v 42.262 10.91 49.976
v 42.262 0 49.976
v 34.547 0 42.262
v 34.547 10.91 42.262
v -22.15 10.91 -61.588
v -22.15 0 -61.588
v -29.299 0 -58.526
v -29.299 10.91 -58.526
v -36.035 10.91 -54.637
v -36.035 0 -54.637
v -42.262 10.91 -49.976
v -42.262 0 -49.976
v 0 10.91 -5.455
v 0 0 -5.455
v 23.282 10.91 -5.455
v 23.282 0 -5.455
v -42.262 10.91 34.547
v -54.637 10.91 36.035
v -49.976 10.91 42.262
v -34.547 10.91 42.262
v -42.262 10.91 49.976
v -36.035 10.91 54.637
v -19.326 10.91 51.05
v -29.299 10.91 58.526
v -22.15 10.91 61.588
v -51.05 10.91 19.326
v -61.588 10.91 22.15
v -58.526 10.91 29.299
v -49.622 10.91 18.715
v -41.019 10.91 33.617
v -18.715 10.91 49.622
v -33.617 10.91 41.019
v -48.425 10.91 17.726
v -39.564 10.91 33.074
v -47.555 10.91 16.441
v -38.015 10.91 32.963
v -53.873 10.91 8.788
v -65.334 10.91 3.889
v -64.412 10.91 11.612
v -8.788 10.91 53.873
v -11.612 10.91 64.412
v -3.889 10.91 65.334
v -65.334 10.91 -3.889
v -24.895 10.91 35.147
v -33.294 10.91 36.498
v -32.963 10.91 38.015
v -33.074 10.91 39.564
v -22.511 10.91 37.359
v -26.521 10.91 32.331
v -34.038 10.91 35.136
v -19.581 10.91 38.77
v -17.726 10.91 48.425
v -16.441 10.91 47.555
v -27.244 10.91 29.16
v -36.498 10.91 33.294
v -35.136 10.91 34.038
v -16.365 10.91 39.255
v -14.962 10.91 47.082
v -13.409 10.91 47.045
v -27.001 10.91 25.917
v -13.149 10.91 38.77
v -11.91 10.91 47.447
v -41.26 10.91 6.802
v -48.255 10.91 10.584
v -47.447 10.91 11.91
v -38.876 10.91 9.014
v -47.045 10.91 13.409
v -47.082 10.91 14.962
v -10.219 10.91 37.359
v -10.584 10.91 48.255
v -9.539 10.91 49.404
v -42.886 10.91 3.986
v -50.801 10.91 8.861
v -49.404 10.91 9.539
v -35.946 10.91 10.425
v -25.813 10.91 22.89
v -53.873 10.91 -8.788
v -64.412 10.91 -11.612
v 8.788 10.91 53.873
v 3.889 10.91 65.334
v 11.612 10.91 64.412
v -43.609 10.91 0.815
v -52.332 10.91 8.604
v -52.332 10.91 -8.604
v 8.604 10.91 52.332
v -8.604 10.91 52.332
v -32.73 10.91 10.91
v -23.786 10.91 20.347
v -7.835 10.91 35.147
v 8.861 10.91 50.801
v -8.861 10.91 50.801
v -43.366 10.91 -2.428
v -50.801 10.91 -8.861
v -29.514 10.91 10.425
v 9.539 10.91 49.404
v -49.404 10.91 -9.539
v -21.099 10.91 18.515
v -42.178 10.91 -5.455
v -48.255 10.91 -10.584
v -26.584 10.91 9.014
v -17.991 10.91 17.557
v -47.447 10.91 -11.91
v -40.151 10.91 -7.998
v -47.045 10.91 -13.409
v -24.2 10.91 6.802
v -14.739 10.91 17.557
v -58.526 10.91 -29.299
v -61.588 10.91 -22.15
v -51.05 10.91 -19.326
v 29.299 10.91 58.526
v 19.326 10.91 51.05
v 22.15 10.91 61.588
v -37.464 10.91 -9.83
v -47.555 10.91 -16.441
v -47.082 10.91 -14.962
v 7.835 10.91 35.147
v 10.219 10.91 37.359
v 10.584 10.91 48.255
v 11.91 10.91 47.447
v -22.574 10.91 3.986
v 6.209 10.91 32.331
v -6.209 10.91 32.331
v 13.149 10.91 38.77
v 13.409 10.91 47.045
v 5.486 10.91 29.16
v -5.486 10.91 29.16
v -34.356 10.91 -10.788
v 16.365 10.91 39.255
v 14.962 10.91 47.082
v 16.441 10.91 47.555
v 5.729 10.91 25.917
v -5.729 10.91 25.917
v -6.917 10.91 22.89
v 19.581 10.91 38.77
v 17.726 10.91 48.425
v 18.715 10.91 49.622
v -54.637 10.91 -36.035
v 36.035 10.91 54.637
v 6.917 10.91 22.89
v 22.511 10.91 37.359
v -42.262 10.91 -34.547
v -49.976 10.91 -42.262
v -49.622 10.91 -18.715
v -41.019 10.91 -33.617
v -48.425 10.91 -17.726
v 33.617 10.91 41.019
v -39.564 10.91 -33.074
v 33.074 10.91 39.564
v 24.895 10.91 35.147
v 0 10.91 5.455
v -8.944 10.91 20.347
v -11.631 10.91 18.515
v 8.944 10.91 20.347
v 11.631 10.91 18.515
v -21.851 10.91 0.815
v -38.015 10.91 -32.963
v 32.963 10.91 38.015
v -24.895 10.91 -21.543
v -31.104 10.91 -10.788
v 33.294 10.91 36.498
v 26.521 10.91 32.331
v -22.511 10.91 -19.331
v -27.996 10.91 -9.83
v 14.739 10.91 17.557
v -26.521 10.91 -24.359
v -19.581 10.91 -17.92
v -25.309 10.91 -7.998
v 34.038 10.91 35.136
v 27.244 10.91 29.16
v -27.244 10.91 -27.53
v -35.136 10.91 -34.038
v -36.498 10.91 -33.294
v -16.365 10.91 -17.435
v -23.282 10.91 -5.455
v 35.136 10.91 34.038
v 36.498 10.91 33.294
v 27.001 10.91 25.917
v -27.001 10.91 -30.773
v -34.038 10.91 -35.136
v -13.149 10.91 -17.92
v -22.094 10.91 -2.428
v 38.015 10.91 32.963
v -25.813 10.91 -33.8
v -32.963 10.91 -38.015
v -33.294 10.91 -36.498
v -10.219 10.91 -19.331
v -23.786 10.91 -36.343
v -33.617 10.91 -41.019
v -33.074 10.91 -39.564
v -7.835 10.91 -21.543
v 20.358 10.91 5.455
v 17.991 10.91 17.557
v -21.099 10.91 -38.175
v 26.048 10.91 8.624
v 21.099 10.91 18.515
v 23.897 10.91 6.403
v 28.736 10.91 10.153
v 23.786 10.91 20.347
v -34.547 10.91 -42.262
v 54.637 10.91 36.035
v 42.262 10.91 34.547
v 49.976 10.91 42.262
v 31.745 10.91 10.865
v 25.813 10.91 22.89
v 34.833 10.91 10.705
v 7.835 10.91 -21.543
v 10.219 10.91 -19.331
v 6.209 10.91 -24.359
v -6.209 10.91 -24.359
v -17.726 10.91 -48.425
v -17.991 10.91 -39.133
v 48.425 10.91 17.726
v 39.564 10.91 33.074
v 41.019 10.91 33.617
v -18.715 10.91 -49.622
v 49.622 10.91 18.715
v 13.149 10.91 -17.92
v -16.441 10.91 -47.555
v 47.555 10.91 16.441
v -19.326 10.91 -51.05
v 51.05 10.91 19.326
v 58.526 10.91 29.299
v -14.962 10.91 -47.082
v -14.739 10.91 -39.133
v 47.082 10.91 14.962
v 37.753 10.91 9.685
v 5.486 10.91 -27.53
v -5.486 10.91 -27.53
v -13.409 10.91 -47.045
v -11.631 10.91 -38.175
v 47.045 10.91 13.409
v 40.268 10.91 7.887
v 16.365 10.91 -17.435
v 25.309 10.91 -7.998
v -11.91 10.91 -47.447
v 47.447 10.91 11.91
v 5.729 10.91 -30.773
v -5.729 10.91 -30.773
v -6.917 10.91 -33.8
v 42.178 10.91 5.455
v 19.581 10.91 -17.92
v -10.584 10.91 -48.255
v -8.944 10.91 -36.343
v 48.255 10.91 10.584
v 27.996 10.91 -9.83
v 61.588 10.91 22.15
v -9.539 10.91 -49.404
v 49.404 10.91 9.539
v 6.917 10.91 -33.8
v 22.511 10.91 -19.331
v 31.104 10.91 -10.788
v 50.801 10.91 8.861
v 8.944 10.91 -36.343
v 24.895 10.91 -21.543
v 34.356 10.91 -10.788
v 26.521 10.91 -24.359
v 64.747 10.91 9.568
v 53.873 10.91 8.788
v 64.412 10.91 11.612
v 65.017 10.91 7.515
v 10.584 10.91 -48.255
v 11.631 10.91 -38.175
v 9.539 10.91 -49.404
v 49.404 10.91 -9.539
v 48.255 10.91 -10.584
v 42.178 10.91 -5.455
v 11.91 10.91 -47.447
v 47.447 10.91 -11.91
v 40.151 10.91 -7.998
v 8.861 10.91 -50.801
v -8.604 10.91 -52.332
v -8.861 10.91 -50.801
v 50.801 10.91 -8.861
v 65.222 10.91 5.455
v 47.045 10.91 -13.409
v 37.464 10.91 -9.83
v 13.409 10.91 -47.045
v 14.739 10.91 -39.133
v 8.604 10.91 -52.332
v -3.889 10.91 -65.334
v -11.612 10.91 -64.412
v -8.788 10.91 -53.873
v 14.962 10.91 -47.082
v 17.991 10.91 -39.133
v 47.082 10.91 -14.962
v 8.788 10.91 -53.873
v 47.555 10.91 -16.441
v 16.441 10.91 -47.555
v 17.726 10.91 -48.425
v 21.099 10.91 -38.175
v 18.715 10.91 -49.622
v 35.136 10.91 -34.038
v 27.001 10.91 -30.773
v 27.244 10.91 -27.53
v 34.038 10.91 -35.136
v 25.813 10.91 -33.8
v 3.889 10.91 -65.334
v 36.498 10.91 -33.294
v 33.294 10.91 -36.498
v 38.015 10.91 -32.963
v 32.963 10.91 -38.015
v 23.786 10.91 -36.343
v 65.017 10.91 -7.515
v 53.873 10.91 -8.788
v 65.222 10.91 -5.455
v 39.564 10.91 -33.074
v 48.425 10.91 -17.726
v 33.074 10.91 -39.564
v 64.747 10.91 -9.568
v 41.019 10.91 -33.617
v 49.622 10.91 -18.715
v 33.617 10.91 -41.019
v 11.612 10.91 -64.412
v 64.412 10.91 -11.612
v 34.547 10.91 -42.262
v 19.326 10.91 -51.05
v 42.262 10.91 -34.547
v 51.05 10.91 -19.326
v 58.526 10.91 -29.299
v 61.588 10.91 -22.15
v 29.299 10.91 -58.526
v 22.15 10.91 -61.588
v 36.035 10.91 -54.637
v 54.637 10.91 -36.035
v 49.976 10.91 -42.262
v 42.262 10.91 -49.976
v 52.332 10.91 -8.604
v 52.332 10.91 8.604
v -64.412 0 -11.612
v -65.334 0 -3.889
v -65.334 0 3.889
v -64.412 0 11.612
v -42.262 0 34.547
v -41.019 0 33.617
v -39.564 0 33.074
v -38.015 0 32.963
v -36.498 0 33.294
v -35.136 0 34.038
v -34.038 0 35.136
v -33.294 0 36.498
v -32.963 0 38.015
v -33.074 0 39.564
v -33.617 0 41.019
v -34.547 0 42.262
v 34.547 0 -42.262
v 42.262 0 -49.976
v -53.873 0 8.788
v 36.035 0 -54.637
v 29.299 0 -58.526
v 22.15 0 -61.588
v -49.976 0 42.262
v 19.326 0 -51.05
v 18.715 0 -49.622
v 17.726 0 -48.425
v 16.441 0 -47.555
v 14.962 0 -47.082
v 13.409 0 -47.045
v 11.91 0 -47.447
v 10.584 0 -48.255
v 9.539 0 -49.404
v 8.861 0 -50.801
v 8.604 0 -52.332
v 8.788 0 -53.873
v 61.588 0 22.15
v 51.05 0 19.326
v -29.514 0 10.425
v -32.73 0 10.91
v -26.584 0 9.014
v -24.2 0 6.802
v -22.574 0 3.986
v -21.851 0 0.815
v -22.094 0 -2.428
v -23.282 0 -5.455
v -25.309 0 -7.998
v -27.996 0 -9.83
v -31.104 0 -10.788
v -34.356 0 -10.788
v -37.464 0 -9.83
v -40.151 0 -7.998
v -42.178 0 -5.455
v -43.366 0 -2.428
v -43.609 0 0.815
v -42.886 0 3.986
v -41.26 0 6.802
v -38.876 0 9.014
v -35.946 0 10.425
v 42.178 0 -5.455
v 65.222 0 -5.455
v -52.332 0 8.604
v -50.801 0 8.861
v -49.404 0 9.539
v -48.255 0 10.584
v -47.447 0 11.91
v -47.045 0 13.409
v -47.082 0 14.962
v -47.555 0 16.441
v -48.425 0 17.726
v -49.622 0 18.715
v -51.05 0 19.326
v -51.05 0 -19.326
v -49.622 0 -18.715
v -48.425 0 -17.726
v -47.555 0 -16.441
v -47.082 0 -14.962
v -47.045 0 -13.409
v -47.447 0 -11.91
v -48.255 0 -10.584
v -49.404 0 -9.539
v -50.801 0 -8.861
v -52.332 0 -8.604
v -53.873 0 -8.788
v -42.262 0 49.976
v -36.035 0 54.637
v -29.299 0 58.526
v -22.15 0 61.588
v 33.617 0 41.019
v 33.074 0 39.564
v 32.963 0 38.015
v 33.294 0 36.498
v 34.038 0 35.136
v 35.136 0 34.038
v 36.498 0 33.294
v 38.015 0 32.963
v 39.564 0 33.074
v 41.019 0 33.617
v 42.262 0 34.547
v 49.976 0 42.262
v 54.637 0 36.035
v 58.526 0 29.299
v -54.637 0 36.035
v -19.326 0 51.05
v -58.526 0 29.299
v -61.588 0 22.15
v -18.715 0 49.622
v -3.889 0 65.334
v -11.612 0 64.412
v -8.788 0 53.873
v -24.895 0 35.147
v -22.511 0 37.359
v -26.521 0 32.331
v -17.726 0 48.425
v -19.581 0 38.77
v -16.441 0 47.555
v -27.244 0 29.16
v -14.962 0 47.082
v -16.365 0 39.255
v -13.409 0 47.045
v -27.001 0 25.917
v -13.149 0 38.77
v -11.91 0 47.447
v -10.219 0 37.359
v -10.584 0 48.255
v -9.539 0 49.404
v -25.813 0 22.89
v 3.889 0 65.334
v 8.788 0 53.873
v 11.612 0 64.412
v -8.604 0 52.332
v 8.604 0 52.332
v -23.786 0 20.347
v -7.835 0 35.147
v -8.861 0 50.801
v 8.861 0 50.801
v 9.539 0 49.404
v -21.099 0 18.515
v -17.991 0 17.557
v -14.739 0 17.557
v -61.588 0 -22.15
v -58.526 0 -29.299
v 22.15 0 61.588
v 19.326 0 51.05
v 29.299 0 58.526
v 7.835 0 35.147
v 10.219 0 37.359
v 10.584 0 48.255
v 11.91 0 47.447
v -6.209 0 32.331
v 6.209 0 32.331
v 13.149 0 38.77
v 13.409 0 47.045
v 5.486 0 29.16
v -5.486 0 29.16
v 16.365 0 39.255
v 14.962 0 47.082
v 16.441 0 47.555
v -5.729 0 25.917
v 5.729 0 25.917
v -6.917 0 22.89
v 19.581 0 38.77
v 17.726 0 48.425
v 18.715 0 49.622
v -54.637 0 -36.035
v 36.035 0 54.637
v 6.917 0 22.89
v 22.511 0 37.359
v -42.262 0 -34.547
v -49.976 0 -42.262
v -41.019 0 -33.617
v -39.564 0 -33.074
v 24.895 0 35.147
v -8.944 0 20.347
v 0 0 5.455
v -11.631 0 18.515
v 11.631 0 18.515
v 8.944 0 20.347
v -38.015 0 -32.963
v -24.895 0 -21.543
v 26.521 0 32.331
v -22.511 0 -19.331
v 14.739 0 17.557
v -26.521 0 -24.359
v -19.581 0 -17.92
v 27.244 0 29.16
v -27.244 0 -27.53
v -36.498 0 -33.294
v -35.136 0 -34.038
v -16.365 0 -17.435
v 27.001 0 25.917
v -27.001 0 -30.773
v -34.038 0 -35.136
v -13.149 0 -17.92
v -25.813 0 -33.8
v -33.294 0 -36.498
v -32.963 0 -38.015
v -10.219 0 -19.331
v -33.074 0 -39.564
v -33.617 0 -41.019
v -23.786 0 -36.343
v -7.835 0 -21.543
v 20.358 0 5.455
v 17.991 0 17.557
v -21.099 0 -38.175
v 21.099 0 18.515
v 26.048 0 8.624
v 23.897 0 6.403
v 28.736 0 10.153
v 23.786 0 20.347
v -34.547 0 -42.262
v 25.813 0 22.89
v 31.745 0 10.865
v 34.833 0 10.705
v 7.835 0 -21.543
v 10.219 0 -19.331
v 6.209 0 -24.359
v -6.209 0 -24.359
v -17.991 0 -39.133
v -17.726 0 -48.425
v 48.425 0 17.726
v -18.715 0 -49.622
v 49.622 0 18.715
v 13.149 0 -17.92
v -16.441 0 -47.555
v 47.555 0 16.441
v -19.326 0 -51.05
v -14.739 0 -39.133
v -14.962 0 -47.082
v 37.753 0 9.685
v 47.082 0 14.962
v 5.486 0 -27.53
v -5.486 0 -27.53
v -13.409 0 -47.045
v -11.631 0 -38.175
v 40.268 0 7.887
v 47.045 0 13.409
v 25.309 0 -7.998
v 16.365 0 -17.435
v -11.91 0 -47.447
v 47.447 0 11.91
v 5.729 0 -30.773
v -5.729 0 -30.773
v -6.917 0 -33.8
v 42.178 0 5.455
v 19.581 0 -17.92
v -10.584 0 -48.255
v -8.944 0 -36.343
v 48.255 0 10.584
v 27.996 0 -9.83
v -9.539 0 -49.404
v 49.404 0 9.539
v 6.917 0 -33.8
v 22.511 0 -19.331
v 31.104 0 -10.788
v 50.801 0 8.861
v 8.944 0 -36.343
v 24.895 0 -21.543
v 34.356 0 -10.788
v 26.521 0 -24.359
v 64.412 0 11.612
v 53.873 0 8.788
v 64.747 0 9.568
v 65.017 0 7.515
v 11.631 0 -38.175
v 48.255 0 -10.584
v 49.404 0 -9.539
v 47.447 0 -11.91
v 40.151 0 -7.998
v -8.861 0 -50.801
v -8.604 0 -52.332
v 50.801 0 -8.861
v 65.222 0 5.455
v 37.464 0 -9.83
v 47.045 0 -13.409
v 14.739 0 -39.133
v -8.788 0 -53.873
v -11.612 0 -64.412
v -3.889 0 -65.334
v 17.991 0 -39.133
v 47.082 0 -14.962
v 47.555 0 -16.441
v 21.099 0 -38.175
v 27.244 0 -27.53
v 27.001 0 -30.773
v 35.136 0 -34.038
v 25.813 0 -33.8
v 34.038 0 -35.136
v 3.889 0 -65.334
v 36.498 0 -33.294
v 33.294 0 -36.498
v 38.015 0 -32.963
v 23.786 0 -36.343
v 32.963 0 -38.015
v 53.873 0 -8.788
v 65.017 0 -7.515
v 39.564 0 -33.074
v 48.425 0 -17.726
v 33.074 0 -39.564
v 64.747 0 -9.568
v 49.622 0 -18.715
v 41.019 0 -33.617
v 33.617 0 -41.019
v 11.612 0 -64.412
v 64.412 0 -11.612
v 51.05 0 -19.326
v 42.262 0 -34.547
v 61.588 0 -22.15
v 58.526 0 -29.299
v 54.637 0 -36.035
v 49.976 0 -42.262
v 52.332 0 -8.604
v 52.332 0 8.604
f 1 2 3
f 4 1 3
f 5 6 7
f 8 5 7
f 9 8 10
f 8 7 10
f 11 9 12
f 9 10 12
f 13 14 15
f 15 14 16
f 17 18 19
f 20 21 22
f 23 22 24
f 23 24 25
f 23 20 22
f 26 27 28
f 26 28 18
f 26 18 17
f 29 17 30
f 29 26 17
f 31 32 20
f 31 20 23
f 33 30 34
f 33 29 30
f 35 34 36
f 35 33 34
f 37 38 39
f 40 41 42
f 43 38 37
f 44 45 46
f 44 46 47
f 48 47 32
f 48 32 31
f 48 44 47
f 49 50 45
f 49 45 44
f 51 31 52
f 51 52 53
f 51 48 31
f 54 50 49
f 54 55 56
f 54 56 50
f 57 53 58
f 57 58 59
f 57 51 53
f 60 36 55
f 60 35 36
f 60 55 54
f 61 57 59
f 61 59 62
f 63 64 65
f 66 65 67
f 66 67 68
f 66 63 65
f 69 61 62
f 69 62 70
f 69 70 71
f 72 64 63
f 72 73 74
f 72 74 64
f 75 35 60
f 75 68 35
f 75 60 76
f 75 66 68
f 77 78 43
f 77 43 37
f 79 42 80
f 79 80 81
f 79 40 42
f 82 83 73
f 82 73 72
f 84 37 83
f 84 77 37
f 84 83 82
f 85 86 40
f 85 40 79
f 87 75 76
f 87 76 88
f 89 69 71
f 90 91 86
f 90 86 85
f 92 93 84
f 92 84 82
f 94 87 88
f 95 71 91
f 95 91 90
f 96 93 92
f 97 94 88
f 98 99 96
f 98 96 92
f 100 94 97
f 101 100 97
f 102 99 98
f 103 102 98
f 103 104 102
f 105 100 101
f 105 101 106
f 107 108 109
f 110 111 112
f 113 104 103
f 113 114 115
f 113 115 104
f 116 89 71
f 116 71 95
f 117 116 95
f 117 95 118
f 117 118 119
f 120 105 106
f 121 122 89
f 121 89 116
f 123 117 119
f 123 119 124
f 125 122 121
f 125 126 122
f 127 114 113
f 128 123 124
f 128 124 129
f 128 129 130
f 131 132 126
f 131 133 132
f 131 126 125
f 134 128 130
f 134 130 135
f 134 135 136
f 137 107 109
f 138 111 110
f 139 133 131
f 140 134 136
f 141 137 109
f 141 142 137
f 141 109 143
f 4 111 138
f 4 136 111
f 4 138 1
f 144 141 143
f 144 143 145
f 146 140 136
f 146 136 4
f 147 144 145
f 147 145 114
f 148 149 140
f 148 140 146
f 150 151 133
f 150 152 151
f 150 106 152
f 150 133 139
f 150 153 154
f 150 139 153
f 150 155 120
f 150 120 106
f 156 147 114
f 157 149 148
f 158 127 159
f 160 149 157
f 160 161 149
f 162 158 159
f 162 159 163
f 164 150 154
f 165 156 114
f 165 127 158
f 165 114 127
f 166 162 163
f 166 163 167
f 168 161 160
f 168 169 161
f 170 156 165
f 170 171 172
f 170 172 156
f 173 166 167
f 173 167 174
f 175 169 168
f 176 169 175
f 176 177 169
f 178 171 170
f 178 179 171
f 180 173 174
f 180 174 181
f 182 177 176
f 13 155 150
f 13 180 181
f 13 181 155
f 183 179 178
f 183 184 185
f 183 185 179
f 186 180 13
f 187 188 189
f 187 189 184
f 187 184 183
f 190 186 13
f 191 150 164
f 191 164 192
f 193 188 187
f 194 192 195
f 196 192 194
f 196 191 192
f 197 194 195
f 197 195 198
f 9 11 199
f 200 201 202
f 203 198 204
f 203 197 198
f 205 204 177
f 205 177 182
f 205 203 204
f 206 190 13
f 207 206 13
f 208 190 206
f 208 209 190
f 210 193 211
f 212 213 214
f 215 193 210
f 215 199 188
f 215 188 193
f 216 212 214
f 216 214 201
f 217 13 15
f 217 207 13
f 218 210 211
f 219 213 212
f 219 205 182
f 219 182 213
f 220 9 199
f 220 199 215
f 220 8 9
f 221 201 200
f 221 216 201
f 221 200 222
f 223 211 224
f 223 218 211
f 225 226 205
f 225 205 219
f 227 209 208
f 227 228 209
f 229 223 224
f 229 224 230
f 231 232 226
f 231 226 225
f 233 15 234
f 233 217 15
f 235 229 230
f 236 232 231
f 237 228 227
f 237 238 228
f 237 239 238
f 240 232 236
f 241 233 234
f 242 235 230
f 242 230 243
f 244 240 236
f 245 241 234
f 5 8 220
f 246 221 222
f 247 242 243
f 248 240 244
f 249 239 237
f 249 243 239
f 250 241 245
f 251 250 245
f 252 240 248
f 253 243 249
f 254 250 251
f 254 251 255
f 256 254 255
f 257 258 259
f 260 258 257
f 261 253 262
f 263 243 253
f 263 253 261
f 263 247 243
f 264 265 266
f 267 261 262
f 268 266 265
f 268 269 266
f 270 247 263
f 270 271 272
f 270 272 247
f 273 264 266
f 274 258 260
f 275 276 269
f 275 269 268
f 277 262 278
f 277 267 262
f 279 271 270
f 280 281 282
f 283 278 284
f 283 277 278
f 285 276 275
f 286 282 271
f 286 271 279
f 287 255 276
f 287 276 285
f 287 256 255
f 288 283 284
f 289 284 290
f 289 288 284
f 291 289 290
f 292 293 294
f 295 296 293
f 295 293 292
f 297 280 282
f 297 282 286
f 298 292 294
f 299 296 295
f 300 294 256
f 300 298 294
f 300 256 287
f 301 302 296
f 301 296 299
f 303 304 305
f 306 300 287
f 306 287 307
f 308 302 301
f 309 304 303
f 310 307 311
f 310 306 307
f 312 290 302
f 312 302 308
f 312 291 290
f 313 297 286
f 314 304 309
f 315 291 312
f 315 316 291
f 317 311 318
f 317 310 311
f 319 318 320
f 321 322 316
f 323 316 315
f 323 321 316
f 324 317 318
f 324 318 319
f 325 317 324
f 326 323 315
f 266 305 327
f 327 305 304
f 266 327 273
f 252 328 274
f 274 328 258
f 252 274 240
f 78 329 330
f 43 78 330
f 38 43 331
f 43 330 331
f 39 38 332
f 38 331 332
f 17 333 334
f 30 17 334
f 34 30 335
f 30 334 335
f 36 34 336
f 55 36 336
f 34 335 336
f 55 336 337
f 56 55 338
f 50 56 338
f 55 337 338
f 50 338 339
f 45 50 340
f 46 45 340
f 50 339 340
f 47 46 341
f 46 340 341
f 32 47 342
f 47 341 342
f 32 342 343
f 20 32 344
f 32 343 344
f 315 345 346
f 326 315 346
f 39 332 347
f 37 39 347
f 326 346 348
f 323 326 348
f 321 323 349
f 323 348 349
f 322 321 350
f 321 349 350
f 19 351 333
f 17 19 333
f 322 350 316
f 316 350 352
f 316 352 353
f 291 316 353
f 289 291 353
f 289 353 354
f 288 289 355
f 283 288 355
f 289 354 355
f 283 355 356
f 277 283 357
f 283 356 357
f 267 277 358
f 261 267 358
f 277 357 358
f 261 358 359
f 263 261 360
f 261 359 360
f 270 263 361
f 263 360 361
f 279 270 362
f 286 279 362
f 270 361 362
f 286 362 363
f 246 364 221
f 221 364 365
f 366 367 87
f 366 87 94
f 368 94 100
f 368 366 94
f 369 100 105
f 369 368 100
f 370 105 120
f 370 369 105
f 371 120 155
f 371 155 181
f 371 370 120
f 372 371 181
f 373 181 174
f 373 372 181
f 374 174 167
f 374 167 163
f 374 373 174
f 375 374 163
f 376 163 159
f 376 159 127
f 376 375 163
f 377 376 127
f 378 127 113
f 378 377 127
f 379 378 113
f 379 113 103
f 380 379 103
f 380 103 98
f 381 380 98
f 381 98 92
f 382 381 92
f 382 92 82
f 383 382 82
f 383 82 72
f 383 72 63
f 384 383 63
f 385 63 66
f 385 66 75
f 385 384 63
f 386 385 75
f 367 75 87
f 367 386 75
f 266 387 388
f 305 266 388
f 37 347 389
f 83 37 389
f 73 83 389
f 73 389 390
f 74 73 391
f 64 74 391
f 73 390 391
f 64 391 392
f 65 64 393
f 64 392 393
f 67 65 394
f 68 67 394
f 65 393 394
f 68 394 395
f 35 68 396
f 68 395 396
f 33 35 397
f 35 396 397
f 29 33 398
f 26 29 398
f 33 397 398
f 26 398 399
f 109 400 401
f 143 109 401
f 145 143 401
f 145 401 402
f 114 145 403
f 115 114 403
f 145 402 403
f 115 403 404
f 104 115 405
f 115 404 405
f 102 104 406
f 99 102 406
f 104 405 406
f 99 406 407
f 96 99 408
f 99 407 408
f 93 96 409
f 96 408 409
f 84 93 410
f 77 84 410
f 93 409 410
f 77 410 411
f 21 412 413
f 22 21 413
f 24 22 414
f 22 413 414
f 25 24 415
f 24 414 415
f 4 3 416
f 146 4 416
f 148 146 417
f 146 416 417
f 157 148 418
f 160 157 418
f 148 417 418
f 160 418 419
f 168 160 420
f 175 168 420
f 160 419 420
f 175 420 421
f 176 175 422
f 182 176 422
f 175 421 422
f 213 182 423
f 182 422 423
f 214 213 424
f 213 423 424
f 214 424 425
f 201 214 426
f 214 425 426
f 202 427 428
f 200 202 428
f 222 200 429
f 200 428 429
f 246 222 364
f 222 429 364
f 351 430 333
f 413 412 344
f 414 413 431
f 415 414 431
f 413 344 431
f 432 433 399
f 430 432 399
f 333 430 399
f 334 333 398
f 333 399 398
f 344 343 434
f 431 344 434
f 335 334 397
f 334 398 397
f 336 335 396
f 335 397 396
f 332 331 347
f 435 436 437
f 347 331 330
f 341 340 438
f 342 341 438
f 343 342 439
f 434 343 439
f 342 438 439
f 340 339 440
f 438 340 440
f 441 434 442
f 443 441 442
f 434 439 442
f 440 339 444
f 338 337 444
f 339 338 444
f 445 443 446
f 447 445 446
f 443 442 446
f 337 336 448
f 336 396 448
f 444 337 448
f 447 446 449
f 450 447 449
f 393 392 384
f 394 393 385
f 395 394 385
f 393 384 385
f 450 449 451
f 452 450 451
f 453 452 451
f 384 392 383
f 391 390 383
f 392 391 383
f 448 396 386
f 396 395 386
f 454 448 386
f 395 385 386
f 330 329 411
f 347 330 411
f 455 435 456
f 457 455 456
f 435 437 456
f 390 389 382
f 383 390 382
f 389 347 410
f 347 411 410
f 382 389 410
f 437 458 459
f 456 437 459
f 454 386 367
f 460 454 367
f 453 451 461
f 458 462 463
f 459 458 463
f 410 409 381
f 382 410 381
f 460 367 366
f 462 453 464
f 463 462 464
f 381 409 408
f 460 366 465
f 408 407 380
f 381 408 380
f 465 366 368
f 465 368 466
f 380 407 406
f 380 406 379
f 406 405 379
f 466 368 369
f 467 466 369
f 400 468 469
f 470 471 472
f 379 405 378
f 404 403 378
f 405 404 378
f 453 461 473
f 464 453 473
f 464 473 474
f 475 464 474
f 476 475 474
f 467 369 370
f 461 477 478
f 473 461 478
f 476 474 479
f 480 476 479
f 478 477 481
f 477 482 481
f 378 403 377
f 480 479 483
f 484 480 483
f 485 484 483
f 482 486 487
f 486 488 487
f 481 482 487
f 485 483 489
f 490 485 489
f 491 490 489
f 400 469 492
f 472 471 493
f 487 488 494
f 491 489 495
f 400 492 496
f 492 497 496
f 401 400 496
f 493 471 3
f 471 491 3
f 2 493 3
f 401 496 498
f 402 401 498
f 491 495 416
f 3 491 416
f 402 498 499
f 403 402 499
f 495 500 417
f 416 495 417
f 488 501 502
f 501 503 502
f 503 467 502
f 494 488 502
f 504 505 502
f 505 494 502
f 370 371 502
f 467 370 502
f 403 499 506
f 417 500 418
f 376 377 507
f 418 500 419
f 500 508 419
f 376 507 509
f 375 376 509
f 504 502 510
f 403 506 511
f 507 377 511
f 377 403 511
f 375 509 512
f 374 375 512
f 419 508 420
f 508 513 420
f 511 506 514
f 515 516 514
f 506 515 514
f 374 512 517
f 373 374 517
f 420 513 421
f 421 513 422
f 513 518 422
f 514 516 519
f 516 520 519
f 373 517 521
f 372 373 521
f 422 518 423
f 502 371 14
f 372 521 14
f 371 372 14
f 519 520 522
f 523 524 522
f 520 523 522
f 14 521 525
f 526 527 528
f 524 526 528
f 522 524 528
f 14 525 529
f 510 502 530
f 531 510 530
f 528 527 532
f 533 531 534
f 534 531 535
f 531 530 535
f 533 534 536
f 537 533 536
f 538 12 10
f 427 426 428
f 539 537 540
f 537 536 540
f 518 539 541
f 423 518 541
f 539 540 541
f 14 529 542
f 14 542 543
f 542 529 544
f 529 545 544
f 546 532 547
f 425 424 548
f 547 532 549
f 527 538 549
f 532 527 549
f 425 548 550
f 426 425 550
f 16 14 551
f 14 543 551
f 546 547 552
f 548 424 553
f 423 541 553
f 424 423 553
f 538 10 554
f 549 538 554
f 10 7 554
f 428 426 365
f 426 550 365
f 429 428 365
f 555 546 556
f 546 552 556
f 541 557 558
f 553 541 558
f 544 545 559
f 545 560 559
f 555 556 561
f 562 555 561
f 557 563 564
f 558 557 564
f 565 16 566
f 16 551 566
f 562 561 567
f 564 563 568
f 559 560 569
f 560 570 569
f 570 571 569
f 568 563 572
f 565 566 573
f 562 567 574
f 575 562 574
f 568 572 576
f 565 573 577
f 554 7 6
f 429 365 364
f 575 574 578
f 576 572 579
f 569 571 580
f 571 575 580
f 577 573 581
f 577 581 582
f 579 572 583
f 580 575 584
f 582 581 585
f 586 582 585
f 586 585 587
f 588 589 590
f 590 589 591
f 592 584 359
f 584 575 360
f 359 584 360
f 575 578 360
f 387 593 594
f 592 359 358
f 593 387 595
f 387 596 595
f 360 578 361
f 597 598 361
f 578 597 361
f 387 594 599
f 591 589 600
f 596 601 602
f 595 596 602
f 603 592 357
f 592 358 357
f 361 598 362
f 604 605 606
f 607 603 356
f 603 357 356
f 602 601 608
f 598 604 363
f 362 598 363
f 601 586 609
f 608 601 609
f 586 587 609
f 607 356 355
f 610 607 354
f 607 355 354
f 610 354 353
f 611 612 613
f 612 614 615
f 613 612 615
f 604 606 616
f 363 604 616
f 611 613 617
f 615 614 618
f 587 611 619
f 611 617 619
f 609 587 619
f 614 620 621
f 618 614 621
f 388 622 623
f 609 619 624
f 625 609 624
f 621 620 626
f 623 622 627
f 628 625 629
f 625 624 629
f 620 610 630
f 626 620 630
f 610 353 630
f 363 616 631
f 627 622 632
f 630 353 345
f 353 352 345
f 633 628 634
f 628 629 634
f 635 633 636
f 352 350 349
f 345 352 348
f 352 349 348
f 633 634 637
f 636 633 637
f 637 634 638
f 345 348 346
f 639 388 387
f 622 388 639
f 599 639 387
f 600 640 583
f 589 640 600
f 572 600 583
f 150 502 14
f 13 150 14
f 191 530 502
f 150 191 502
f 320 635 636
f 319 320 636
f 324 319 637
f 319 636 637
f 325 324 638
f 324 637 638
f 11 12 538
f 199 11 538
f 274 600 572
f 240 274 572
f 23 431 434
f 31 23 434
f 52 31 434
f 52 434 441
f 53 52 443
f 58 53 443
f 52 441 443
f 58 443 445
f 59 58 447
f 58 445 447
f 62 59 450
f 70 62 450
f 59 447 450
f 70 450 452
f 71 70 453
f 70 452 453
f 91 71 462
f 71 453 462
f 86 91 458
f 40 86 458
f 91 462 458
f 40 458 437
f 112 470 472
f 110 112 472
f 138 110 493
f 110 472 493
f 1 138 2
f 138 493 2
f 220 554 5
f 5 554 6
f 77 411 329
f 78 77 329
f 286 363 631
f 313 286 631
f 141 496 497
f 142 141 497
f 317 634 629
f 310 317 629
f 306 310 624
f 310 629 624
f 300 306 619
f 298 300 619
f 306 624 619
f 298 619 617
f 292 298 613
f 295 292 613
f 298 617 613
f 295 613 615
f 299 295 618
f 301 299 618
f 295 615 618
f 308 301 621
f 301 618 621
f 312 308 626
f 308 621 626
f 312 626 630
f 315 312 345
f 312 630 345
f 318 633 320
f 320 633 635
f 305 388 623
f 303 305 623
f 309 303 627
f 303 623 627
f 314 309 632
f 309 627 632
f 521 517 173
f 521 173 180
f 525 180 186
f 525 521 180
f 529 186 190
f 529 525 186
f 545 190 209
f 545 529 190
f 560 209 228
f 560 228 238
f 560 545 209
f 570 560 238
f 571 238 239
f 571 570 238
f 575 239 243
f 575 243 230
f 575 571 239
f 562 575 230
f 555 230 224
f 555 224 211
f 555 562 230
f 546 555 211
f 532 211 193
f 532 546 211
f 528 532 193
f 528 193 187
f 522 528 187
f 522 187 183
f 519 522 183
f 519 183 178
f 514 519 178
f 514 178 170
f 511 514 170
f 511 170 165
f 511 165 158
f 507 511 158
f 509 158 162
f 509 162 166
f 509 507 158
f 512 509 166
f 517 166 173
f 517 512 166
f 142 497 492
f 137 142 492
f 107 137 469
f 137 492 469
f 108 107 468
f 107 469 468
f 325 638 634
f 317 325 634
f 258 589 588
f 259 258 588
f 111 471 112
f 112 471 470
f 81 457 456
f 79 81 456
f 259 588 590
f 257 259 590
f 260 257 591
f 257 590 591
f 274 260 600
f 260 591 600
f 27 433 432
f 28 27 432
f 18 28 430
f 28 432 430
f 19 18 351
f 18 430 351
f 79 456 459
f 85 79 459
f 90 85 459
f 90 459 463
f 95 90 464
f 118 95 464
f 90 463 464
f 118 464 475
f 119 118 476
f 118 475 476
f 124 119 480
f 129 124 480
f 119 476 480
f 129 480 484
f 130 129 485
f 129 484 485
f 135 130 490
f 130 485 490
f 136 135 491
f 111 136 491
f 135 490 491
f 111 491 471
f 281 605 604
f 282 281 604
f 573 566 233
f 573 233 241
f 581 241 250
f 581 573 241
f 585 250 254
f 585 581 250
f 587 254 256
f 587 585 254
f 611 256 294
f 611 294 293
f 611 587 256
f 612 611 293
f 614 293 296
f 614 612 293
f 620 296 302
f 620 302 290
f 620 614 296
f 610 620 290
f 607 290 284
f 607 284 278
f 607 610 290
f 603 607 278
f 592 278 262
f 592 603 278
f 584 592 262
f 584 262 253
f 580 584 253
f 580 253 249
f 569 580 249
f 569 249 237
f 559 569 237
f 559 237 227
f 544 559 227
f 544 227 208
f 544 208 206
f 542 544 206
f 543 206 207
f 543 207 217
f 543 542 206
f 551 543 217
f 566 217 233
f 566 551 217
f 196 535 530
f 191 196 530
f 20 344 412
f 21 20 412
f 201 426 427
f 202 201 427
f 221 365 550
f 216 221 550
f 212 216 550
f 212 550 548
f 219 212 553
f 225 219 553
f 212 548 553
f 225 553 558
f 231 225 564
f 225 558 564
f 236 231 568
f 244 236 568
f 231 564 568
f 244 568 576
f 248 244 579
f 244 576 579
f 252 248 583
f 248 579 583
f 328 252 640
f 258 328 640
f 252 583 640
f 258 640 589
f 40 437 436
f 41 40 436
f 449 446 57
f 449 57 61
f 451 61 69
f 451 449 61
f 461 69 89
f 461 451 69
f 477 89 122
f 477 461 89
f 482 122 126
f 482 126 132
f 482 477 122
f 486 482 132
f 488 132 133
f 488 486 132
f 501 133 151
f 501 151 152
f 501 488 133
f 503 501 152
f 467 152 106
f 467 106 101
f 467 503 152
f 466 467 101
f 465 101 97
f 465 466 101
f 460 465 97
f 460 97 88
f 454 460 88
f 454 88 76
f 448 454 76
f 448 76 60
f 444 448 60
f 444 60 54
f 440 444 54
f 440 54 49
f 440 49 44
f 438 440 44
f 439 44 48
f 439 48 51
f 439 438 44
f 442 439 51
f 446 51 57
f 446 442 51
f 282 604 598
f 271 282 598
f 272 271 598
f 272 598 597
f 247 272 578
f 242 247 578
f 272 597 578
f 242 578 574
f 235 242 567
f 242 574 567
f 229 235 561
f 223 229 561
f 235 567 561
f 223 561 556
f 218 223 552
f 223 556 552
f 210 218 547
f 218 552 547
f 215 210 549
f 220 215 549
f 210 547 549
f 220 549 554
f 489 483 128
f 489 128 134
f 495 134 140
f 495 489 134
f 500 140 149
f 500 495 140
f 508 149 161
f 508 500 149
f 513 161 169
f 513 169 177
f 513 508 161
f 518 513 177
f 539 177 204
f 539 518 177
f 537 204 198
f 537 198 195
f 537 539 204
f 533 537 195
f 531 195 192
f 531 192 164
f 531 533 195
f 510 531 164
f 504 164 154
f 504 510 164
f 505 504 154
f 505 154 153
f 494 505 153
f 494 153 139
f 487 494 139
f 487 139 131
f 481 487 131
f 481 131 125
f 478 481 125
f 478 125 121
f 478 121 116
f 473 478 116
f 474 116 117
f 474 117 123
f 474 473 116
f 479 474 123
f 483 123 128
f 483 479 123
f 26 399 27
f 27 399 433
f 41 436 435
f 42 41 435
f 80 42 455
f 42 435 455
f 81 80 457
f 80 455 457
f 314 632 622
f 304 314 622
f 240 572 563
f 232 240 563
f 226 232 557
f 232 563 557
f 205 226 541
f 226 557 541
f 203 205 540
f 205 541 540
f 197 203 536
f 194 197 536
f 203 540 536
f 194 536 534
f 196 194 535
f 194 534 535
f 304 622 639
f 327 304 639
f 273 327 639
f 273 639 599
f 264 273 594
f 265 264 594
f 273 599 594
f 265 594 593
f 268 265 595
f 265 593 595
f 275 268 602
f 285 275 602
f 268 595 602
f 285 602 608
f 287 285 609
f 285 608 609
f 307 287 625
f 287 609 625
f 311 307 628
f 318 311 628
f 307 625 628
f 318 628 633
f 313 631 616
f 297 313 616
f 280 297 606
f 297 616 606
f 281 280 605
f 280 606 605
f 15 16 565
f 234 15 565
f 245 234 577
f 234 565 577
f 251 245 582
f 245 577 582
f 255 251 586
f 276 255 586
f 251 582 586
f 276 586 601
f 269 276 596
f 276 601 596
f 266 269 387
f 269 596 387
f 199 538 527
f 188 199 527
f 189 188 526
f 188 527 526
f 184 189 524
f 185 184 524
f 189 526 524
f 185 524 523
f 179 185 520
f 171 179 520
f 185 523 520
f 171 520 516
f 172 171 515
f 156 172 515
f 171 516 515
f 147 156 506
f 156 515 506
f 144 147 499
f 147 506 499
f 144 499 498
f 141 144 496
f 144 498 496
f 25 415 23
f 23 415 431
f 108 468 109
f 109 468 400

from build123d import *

# Parameters (mm, degrees)
SKETCH1_R           = 10.91
BOSS_EXTRUDE1_DEPTH = 10.91


with BuildPart() as part:
    # Sketch1 → Boss-Extrude1 (new body)
    with BuildSketch(Plane(origin=(0, 0, 0), x_dir=(1, 0, 0), z_dir=(0, 1, 0))):
        with BuildLine():
            Line((0, -5.455), (0, 5.455))
            Line((0, 5.455), (23.281662845, 5.455))
            ThreePointArc((23.281662845, 5.455), (32.73, 10.91), (42.178337155, 5.455))
            Line((42.178337155, 5.455), (65.222277444, 5.455))
            ThreePointArc((65.222277444, 5.455), (64.890066177, 8.542939281), (64.411740124, 11.611642185))
            Line((64.411740124, 11.611642185), (53.873489359, 8.787926403))
            ThreePointArc((53.873489359, 8.787926403), (47.192506085, 12.645193894), (51.049773577, 19.326177168))
            Line((51.049773577, 19.326177168), (61.588024342, 22.14989295))
            ThreePointArc((61.588024342, 22.14989295), (56.681362678, 32.725), (49.976382157, 42.261847174))
            Line((49.976382157, 42.261847174), (42.261847174, 34.547312191))
            ThreePointArc((42.261847174, 34.547312191), (34.547312191, 34.547312191), (34.547312191, 42.261847174))
            Line((34.547312191, 42.261847174), (42.261847174, 49.976382157))
            ThreePointArc((42.261847174, 49.976382157), (32.725, 56.681362678), (22.14989295, 61.588024342))
            Line((22.14989295, 61.588024342), (19.326177168, 51.049773577))
            ThreePointArc((19.326177168, 51.049773577), (12.645193894, 47.192506085), (8.787926403, 53.873489359))
            Line((8.787926403, 53.873489359), (11.611642185, 64.411740124))
            ThreePointArc((11.611642185, 64.411740124), (0, 65.45), (-11.611642185, 64.411740124))
            Line((-11.611642185, 64.411740124), (-8.787926403, 53.873489359))
            ThreePointArc((-8.787926403, 53.873489359), (-12.645193894, 47.192506085), (-19.326177168, 51.049773577))
            Line((-19.326177168, 51.049773577), (-22.14989295, 61.588024342))
            ThreePointArc((-22.14989295, 61.588024342), (-32.725, 56.681362678), (-42.261847174, 49.976382157))
            Line((-42.261847174, 49.976382157), (-34.547312191, 42.261847174))
            ThreePointArc((-34.547312191, 42.261847174), (-34.547312191, 34.547312191), (-42.261847174, 34.547312191))
            Line((-42.261847174, 34.547312191), (-49.976382157, 42.261847174))
            ThreePointArc((-49.976382157, 42.261847174), (-56.681362678, 32.725), (-61.588024342, 22.14989295))
            Line((-61.588024342, 22.14989295), (-51.049773577, 19.326177168))
            ThreePointArc((-51.049773577, 19.326177168), (-47.192506085, 12.645193894), (-53.873489359, 8.787926403))
            Line((-53.873489359, 8.787926403), (-64.411740124, 11.611642185))
            ThreePointArc((-64.411740124, 11.611642185), (-65.45, 0), (-64.411740124, -11.611642185))
            Line((-64.411740124, -11.611642185), (-53.873489359, -8.787926403))
            ThreePointArc((-53.873489359, -8.787926403), (-47.192506085, -12.645193894), (-51.049773577, -19.326177168))
            Line((-51.049773577, -19.326177168), (-61.588024342, -22.14989295))
            ThreePointArc((-61.588024342, -22.14989295), (-56.681362678, -32.725), (-49.976382157, -42.261847174))
            Line((-49.976382157, -42.261847174), (-42.261847174, -34.547312191))
            ThreePointArc((-42.261847174, -34.547312191), (-34.547312191, -34.547312191), (-34.547312191, -42.261847174))
            Line((-34.547312191, -42.261847174), (-42.261847174, -49.976382157))
            ThreePointArc((-42.261847174, -49.976382157), (-32.725, -56.681362678), (-22.14989295, -61.588024342))
            Line((-22.14989295, -61.588024342), (-19.326177168, -51.049773577))
            ThreePointArc((-19.326177168, -51.049773577), (-12.645193894, -47.192506085), (-8.787926403, -53.873489359))
            Line((-8.787926403, -53.873489359), (-11.611642185, -64.411740124))
            ThreePointArc((-11.611642185, -64.411740124), (0, -65.45), (11.611642185, -64.411740124))
            Line((11.611642185, -64.411740124), (8.787926403, -53.873489359))
            ThreePointArc((8.787926403, -53.873489359), (12.645193894, -47.192506085), (19.326177168, -51.049773577))
            Line((19.326177168, -51.049773577), (22.14989295, -61.588024342))
            ThreePointArc((22.14989295, -61.588024342), (32.725, -56.681362678), (42.261847174, -49.976382157))
            Line((42.261847174, -49.976382157), (34.547312191, -42.261847174))
            ThreePointArc((34.547312191, -42.261847174), (34.547312191, -34.547312191), (42.261847174, -34.547312191))
            Line((42.261847174, -34.547312191), (49.976382157, -42.261847174))
            ThreePointArc((49.976382157, -42.261847174), (56.681362678, -32.725), (61.588024342, -22.14989295))
            Line((61.588024342, -22.14989295), (51.049773577, -19.326177168))
            ThreePointArc((51.049773577, -19.326177168), (47.192506085, -12.645193894), (53.873489359, -8.787926403))
            Line((53.873489359, -8.787926403), (64.411740124, -11.611642185))
            ThreePointArc((64.411740124, -11.611642185), (64.890066177, -8.542939281), (65.222277444, -5.455))
            Line((65.222277444, -5.455), (42.178337155, -5.455))
            ThreePointArc((42.178337155, -5.455), (33.295026603, -10.895358871), (23.896615512, -6.403078828))
            Line((23.896615512, -6.403078828), (20.358337155, -5.455))
            Line((20.358337155, -5.455), (0, -5.455))
        make_face()
        with Locations(Location((-16.365, -28.345011466, 0), (0, 0, 270))):
            Circle(SKETCH1_R, mode=Mode.SUBTRACT)
        with Locations(Location((16.365, -28.345011466, 0), (0, 0, 270))):
            Circle(SKETCH1_R, mode=Mode.SUBTRACT)
        with Locations(Location((-32.73, 0, 0), (0, 0, 270))):
            Circle(SKETCH1_R, mode=Mode.SUBTRACT)
        with Locations(Location((-16.365, 28.345011466, 0), (0, 0, 270))):
            Circle(SKETCH1_R, mode=Mode.SUBTRACT)
        with Locations(Location((16.365, 28.345011466, 0), (0, 0, 270))):
            Circle(SKETCH1_R, mode=Mode.SUBTRACT)
    extrude(amount=BOSS_EXTRUDE1_DEPTH)


solid = part.part
